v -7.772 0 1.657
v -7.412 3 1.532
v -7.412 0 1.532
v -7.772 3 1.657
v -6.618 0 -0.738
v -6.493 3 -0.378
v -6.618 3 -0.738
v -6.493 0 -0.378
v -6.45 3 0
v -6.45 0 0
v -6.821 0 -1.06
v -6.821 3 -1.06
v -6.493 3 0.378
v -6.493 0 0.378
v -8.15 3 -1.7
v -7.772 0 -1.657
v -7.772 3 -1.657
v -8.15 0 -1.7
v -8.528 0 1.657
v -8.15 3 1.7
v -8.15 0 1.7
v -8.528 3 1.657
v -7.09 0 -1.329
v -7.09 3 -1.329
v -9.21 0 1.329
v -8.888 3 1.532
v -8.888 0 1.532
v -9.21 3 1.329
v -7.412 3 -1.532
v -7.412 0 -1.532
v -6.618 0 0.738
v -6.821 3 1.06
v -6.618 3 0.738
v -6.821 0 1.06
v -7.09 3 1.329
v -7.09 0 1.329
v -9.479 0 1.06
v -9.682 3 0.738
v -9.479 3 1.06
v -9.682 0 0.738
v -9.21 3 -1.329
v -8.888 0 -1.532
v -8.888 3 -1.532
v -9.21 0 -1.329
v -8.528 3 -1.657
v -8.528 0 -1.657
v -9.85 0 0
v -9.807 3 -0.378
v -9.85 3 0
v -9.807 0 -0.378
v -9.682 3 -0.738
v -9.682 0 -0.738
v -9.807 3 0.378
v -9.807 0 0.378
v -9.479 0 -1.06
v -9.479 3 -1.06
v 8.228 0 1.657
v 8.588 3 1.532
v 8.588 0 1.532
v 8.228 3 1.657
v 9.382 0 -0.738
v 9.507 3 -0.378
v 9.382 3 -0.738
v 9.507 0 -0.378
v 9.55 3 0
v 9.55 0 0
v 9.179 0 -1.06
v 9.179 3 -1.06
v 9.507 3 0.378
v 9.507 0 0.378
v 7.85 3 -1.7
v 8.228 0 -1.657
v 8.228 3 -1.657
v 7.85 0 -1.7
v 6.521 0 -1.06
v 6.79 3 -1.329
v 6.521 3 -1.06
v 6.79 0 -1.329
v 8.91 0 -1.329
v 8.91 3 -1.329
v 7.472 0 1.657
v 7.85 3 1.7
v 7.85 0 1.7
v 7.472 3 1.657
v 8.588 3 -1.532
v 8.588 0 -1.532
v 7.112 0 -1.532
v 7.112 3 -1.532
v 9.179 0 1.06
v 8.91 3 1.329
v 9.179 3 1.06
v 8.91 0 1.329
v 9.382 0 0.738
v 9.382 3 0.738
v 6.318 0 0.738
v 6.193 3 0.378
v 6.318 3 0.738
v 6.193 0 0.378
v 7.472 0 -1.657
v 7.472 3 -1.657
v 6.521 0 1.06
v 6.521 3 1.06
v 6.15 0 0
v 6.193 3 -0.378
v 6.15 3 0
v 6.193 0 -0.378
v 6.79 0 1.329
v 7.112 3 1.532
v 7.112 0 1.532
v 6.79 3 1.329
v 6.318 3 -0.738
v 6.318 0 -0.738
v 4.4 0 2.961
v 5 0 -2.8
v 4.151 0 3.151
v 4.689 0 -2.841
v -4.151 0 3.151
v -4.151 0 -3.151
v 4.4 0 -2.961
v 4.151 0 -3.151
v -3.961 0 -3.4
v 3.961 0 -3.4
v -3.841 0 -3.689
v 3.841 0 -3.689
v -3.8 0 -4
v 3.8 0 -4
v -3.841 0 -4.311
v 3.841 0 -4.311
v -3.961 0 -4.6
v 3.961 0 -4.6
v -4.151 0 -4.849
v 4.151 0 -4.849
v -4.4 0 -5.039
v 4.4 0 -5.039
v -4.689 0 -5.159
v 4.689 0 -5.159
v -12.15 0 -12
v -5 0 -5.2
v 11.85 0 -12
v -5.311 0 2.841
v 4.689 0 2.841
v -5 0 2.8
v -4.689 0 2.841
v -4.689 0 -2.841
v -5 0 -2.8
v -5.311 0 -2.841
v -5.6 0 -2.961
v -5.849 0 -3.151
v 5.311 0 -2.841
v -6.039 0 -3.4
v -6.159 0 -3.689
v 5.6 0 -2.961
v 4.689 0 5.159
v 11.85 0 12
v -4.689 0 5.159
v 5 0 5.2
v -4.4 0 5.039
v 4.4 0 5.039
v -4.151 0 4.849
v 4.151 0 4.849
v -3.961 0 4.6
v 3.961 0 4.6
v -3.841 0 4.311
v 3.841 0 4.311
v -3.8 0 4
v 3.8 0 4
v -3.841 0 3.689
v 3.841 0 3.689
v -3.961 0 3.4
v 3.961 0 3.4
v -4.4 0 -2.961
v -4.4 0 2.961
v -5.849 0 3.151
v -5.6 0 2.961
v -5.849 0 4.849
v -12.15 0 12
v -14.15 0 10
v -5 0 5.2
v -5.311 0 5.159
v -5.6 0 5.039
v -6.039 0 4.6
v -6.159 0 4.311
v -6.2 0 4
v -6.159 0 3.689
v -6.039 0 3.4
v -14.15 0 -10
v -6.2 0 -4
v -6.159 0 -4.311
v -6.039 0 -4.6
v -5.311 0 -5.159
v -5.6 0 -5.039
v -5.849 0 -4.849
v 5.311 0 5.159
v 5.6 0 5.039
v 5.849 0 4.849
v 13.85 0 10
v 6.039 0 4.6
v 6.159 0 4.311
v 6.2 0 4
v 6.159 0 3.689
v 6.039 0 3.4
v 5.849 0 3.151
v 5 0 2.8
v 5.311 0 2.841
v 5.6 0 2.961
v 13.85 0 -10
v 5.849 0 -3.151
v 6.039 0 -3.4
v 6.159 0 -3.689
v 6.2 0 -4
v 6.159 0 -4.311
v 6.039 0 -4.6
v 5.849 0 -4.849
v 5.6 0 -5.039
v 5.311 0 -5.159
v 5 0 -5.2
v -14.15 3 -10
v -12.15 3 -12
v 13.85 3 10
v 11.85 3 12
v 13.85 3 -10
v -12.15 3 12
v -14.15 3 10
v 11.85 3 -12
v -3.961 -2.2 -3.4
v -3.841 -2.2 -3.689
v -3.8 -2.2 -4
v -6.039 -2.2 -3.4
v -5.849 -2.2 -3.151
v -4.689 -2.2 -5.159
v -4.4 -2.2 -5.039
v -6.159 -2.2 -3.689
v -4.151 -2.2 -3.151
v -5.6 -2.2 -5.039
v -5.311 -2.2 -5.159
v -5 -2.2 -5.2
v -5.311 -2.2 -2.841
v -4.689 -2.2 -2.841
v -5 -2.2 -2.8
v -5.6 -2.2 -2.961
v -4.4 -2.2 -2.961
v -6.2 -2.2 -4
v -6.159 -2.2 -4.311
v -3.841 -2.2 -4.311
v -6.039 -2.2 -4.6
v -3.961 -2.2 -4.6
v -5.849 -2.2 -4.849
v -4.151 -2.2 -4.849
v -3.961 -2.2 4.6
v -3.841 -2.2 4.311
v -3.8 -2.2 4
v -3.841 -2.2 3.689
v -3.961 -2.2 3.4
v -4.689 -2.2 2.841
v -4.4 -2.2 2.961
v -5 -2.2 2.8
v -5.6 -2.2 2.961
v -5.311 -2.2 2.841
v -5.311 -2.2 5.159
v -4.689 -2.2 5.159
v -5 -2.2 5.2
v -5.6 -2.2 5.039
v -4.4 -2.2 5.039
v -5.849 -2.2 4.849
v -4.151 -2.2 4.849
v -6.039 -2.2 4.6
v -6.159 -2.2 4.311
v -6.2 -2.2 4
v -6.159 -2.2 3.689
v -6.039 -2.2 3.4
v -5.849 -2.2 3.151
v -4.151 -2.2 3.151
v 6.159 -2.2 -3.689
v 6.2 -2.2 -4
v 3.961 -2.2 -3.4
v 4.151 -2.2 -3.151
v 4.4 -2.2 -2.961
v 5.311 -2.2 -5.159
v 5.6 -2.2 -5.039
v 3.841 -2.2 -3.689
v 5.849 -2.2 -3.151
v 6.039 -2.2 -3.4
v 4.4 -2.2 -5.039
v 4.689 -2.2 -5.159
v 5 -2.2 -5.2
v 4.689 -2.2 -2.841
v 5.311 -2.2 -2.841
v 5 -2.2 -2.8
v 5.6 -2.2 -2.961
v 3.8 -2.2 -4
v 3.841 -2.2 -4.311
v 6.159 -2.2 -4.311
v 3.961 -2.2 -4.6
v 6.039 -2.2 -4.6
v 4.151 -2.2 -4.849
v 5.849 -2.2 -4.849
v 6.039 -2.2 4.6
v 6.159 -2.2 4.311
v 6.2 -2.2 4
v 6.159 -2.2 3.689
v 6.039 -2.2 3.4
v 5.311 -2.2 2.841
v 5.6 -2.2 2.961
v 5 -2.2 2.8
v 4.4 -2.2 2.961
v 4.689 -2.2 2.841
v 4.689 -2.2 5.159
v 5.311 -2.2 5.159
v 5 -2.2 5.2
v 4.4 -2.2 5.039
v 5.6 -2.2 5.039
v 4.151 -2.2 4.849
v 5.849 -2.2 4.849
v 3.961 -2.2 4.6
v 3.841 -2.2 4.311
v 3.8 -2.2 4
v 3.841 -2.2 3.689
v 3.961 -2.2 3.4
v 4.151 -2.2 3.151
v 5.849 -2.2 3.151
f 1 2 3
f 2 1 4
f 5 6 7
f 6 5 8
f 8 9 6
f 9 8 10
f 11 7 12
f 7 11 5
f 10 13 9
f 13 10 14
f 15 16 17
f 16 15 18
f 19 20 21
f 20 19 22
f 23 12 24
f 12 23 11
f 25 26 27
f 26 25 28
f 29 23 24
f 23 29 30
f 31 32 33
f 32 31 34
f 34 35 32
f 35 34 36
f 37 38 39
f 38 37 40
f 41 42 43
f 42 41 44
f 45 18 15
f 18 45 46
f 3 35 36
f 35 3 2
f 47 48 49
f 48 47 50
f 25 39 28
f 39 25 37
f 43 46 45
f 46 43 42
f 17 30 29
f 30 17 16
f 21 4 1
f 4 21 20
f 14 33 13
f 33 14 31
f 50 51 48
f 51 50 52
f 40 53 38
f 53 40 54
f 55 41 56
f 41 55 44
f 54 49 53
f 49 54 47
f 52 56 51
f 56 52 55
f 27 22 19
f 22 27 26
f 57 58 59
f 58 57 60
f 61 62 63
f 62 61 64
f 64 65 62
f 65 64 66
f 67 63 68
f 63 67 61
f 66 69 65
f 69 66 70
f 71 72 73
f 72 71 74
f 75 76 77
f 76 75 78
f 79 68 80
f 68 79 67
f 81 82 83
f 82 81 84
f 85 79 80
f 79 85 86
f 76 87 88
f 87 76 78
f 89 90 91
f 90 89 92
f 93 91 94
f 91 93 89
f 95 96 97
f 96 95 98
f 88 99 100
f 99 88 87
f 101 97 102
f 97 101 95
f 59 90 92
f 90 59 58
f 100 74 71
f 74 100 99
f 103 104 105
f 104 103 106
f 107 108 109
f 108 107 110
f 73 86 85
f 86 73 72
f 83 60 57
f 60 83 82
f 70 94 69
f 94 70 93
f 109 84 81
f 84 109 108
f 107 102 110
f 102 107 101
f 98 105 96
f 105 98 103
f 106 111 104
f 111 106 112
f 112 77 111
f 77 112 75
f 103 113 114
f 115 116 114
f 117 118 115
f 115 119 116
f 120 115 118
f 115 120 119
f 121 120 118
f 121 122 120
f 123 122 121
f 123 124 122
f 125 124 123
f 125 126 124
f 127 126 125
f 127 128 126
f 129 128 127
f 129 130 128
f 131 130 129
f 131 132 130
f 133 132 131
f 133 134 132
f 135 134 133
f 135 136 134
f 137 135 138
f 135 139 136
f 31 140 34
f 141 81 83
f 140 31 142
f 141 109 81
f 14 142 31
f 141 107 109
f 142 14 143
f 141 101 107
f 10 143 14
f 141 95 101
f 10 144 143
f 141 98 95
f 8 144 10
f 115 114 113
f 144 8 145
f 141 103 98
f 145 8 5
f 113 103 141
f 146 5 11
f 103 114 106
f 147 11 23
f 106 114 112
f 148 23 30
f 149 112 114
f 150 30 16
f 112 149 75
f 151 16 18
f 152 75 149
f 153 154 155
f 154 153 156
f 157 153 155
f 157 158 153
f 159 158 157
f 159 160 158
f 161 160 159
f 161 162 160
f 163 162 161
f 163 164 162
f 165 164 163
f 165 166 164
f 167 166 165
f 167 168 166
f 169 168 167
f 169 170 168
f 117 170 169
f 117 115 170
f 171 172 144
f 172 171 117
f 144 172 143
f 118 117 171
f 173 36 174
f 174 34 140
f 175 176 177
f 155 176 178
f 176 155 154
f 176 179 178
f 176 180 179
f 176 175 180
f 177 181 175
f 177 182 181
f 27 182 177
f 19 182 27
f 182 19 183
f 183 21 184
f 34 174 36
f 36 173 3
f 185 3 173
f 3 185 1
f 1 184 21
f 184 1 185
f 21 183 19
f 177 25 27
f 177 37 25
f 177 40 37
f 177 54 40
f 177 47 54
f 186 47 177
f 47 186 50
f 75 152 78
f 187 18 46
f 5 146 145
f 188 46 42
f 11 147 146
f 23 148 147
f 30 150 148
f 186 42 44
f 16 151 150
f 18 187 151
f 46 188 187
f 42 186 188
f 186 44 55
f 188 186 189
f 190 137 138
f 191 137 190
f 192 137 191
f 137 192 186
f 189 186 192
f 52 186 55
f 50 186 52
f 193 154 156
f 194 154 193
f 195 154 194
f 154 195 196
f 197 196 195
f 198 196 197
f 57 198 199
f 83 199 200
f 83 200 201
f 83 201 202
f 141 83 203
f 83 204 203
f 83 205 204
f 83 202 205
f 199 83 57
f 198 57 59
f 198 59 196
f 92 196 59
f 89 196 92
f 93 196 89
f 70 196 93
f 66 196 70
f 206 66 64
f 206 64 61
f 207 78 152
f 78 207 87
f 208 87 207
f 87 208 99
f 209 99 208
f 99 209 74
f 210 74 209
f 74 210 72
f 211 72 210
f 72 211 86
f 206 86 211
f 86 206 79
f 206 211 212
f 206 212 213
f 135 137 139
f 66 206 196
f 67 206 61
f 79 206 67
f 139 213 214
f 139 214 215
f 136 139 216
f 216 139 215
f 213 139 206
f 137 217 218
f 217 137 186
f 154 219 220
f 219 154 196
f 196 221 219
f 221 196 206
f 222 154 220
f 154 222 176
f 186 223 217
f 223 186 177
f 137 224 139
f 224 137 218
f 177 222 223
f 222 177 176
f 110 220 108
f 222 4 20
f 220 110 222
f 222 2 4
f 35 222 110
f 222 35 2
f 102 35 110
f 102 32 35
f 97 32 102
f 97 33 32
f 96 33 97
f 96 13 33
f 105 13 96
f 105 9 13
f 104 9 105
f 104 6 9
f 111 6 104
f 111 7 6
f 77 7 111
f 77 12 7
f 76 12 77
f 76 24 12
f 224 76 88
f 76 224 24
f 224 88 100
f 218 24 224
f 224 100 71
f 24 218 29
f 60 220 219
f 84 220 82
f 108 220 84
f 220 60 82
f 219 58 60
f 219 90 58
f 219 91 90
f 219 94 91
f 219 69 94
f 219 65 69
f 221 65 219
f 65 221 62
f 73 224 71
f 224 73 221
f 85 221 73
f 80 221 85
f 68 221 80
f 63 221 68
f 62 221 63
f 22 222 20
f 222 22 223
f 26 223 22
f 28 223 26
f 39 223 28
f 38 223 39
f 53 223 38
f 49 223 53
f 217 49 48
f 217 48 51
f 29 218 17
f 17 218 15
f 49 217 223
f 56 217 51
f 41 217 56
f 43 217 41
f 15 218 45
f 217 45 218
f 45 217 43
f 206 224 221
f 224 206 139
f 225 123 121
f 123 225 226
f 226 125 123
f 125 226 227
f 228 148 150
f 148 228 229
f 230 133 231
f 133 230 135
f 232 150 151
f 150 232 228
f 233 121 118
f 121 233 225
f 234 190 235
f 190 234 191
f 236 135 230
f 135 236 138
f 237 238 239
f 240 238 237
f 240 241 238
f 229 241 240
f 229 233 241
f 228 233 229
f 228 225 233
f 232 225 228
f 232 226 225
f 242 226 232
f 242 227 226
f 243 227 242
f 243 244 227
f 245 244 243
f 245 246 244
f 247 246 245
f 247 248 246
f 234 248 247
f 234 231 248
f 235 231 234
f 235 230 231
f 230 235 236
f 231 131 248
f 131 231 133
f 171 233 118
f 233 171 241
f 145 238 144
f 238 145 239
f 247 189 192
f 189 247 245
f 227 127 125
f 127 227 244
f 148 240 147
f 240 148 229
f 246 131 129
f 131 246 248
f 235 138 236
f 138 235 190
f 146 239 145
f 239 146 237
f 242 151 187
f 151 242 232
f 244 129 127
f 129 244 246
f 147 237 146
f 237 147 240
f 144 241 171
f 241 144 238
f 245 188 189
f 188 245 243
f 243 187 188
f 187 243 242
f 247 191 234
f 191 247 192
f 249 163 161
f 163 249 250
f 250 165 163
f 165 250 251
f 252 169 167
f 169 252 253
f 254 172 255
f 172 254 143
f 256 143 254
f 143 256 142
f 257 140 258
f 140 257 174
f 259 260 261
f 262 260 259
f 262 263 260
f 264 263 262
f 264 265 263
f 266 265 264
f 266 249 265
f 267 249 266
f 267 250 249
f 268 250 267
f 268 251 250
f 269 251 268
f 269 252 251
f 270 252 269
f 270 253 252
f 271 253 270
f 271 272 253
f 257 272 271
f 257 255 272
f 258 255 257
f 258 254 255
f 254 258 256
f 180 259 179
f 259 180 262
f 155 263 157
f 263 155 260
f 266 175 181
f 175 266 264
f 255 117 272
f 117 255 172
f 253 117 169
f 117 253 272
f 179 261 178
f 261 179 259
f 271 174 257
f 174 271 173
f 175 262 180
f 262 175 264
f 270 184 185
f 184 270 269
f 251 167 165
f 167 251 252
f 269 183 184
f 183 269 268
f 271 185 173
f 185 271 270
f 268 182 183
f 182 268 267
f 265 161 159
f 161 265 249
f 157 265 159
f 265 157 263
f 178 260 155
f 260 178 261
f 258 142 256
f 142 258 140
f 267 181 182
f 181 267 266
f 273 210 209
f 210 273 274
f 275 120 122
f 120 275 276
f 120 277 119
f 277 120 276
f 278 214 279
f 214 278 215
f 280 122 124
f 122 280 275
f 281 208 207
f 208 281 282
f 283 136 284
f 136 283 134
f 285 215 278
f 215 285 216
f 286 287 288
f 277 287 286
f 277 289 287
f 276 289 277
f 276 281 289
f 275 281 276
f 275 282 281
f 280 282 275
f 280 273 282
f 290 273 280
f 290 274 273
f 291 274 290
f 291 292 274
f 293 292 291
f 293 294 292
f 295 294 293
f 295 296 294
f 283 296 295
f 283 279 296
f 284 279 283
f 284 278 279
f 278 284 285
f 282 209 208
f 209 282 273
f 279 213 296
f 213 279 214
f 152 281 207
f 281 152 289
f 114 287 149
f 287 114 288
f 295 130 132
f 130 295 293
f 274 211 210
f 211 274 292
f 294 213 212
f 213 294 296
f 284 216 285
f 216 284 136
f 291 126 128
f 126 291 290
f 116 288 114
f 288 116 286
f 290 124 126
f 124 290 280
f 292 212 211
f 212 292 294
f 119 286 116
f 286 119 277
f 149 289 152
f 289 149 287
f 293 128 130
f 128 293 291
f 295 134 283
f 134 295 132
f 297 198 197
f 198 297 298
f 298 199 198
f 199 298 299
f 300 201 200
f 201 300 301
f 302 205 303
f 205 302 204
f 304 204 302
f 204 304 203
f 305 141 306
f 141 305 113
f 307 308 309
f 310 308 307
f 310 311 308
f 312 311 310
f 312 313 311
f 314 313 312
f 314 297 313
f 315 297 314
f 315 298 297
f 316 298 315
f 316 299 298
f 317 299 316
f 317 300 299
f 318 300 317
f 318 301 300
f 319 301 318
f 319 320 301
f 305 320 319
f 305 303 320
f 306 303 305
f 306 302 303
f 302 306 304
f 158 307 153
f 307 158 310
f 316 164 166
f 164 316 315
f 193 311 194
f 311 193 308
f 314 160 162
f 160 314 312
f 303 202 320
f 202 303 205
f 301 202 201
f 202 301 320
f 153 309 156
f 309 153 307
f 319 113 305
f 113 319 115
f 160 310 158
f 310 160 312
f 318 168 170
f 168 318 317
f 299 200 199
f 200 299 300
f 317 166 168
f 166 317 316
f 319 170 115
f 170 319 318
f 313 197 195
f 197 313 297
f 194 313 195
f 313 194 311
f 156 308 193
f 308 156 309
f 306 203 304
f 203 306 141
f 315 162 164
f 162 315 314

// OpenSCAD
// file: ../config/project_config.scad
// HUB75 display frame - V1.1 shared project configuration
//
// V1.1 uses the nominal HUB75 panel pitch as the structural grid. The actual
// panel PCB is slightly smaller than this nominal grid, leaving a small amount
// of mechanical clearance between adjacent panels.

$fn = 40;

/* [Panels] */
panel_nominal_width = 160.00;
panel_nominal_height = 320.00;

panel_width = 159.70;
panel_height = 319.71;
panel_thickness = 13.00;
panel_count = 5;

panel_hole_x = [7.85, 151.85];
panel_hole_z = [7.855, 159.855, 311.855];
panel_hole_diameter = 3.0;

// Simplified rear connector positions on the HUB75 panel reference model.
data_connector_z_bottom = 82.0;
data_connector_z_top = panel_height - 82.0;

power_connector_x = panel_width / 2;
power_connector_z = panel_height * 0.42;
power_connector_width = 12.0;
power_connector_height = 24.0;
power_connector_depth = 7.0;

/* [Panel array] */
panel_pitch = panel_nominal_width;
display_nominal_width = panel_count * panel_nominal_width;
display_nominal_height = panel_nominal_height;
display_actual_width = (panel_count - 1) * panel_pitch + panel_width;
display_actual_height = panel_height;

// V1.1 reference coordinate system:
// X = left edge of panel 1 nominal cell / panel array
// Y = front face of the HUB75 panels
// Z = bottom edge of the nominal 320 mm panel cell
panel_front_y = 0;
panel_z_offset = 0;

function panel_x(index) = index * panel_pitch;
function panel_hole_x_global(index, right=false) =
    panel_x(index) + (right ? panel_hole_x[1] : panel_hole_x[0]);

/* [Printed frame modules] */
frame_module_size = 160.0;
frame_module_thickness = 4.0;
frame_module_opening_size = 132.0;
frame_module_opening_radius = 8.0;
frame_module_mount_hole_diameter = 3.4;

// The middle HUB75 screw row lies almost exactly on the 160 mm horizontal
// module seam. V1.1 assigns those screws to the lower module. Since both screw
// positions are close to the vertical module edges, each lower module gets an
// edge-connected trapezoidal tab. The upper module receives the matching cutout.
// This keeps every screw hole in one part and avoids thin points where four
// modules meet.
frame_middle_screw_tab_depth = 7.0;
frame_middle_screw_tab_base_width = 20.0;
frame_middle_screw_tab_tip_width = 14.0;
frame_middle_screw_tab_clearance = 0.35;

// The module lies directly behind the nominal rear face of the HUB75 panel.
frame_module_y = panel_thickness;

// Two puzzle-style keys per joined edge. Outer display edges are kept plain
// by the assembly so a separate visible border can be added later.
frame_interlock_positions = [50, 110];
frame_interlock_depth = 8.0;
frame_interlock_neck_width = 10.0;
frame_interlock_head_width = 18.0;
frame_interlock_clearance = 0.30;

frame_grid_columns = panel_count;
frame_grid_rows = 2;

/* [Panel seam joiners] */
// A small printed bridge is placed over each vertical panel seam at every
// existing HUB75 screw row. The two panel screws then clamp both neighbouring
// panels and both underlying frame modules through one common part.
seam_joiner_thickness = 3.0;
seam_joiner_width = 28.0;
seam_joiner_height = 24.0;
seam_joiner_corner_chamfer = 2.0;
seam_joiner_screw_hole_diameter = 3.4;

// Existing panel screw positions relative to the nominal 160 mm panel seam.
seam_joiner_left_screw_x = panel_hole_x[1] - panel_nominal_width;
seam_joiner_right_screw_x = panel_hole_x[0];

// Four small locating pins register the joiner to the printed frame modules.
// At the middle screw row these naturally locate into all four modules around
// the 160 x 160 mm grid intersection.
seam_joiner_pin_x_offset = 5.0;
seam_joiner_pin_z_offset = 4.0;
seam_joiner_pin_diameter = 2.4;
seam_joiner_pin_hole_diameter = 2.8;
seam_joiner_pin_length = 2.2;

// Joiners sit on the rear face of the 4 mm frame modules.
seam_joiner_y = frame_module_y + frame_module_thickness;


/* [Aluminium stiffening tubes] */
// Two continuous tubes run along the top and bottom of the display. In side
// view the printed frame plate continues straight past the panel edge and the
// C-shaped tube clamp sits beside that extension. The tube axis is therefore
// perpendicular to the plate extension, matching the intended simple T-like
// construction.
stiffening_tube_outer_diameter = 10.0;
stiffening_tube_wall_thickness = 1.0;
stiffening_tube_inner_diameter = stiffening_tube_outer_diameter - 2*stiffening_tube_wall_thickness;
stiffening_tube_length = display_nominal_width;

// Snap-clip geometry. Two short clips per 160 mm module distribute the load
// along the full 800 mm tube.
tube_clip_positions = [40, 120];
tube_clip_length = 20.0;
tube_clip_wall = 2.6;
tube_clip_inner_diameter = 10.4;
tube_clip_opening = 8.2;

// In side view the clamp sits beside the straight plate extension. Its rear
// outer wall overlaps the plate by this amount. The C opening is on the
// opposite side, i.e. rotated 90 degrees from the old upward-facing clamp.
tube_clip_plate_overlap = 1.4;

// Vertical overlap of the straight extension into the closed side of the
// C-shaped ring.
tube_clip_vertical_overlap = 2.0;

function tube_clip_outer_diameter() = tube_clip_inner_diameter + 2*tube_clip_wall;
function tube_clip_outer_radius() = tube_clip_outer_diameter()/2;

// The frame module occupies Y = frame_module_y .. frame_module_y + thickness.
// Place the ring mostly in front of it, with only the configured overlap into
// the module's front face. The aluminium tube itself remains above/below the
// screen panel and is accessible from the opposite side for future border
// clips.
function stiffening_tube_y() = frame_module_y + tube_clip_plate_overlap - tube_clip_outer_radius();
function stiffening_tube_bottom_z() = -tube_clip_outer_radius();
function stiffening_tube_top_z() = display_nominal_height + tube_clip_outer_radius();

/* [Hidden] */
color_panel = [0.08,0.10,0.09,1];
color_pcb = [0.02,0.20,0.07,1];
color_frame_module_r1 = [0.82,0.07,0.05,1];
color_frame_module_r2 = [0.55,0.03,0.025,1];
color_seam_joiner = [0.96,0.18,0.08,1];
color_aluminium_tube = [0.72,0.74,0.76,1];
// main file
// HUB75 display frame - V1.1 panel seam joiner
//
// Separate printed plate spanning one vertical seam between two HUB75 panels.
// The two existing panel screw positions pass through one continuous joiner. Four
// small locating pins register the joiner in matching holes in the underlying
// 160 x 160 mm frame modules.

include <../config/project_config.scad>

module seam_joiner_outline_2d() {
    // One continuous plate rather than two circular pads joined by a narrow
    // bridge. Small chamfers keep the shape compact and consistent with the
    // angular language of the frame-module puzzle joints.
    center_x = (seam_joiner_left_screw_x + seam_joiner_right_screw_x) / 2;
    half_w = seam_joiner_width / 2;
    half_h = seam_joiner_height / 2;
    c = min(seam_joiner_corner_chamfer, half_w, half_h);

    translate([center_x, 0])
        polygon([
            [-half_w + c, -half_h],
            [ half_w - c, -half_h],
            [ half_w,     -half_h + c],
            [ half_w,      half_h - c],
            [ half_w - c,  half_h],
            [-half_w + c,  half_h],
            [-half_w,       half_h - c],
            [-half_w,      -half_h + c]
        ]);
}

module seam_joiner_body() {
    color(color_seam_joiner)
        difference() {
            translate([0,seam_joiner_thickness,0])
                rotate([90,0,0])
                    linear_extrude(height=seam_joiner_thickness)
                        seam_joiner_outline_2d();

            // The two existing HUB75 screws provide the actual clamping force.
            for(x=[seam_joiner_left_screw_x, seam_joiner_right_screw_x])
                translate([x,-0.1,0])
                    rotate([-90,0,0])
                        cylinder(
                            h=seam_joiner_thickness + 0.2,
                            d=seam_joiner_screw_hole_diameter,
                            $fn=28
                        );
        }
}

module seam_joiner_locating_pins() {
    color(color_seam_joiner)
        for(x=[-seam_joiner_pin_x_offset, seam_joiner_pin_x_offset])
            for(z=[-seam_joiner_pin_z_offset, seam_joiner_pin_z_offset])
                translate([x,0,z])
                    rotate([90,0,0])
                        cylinder(
                            h=seam_joiner_pin_length,
                            d=seam_joiner_pin_diameter,
                            $fn=24
                        );
}

module panel_seam_joiner(show_pins=true) {
    union() {
        seam_joiner_body();
        if(show_pins)
            seam_joiner_locating_pins();
    }
}

/* [Standalone preview] */
preview_show_pins = true;

panel_seam_joiner(show_pins=preview_show_pins);
